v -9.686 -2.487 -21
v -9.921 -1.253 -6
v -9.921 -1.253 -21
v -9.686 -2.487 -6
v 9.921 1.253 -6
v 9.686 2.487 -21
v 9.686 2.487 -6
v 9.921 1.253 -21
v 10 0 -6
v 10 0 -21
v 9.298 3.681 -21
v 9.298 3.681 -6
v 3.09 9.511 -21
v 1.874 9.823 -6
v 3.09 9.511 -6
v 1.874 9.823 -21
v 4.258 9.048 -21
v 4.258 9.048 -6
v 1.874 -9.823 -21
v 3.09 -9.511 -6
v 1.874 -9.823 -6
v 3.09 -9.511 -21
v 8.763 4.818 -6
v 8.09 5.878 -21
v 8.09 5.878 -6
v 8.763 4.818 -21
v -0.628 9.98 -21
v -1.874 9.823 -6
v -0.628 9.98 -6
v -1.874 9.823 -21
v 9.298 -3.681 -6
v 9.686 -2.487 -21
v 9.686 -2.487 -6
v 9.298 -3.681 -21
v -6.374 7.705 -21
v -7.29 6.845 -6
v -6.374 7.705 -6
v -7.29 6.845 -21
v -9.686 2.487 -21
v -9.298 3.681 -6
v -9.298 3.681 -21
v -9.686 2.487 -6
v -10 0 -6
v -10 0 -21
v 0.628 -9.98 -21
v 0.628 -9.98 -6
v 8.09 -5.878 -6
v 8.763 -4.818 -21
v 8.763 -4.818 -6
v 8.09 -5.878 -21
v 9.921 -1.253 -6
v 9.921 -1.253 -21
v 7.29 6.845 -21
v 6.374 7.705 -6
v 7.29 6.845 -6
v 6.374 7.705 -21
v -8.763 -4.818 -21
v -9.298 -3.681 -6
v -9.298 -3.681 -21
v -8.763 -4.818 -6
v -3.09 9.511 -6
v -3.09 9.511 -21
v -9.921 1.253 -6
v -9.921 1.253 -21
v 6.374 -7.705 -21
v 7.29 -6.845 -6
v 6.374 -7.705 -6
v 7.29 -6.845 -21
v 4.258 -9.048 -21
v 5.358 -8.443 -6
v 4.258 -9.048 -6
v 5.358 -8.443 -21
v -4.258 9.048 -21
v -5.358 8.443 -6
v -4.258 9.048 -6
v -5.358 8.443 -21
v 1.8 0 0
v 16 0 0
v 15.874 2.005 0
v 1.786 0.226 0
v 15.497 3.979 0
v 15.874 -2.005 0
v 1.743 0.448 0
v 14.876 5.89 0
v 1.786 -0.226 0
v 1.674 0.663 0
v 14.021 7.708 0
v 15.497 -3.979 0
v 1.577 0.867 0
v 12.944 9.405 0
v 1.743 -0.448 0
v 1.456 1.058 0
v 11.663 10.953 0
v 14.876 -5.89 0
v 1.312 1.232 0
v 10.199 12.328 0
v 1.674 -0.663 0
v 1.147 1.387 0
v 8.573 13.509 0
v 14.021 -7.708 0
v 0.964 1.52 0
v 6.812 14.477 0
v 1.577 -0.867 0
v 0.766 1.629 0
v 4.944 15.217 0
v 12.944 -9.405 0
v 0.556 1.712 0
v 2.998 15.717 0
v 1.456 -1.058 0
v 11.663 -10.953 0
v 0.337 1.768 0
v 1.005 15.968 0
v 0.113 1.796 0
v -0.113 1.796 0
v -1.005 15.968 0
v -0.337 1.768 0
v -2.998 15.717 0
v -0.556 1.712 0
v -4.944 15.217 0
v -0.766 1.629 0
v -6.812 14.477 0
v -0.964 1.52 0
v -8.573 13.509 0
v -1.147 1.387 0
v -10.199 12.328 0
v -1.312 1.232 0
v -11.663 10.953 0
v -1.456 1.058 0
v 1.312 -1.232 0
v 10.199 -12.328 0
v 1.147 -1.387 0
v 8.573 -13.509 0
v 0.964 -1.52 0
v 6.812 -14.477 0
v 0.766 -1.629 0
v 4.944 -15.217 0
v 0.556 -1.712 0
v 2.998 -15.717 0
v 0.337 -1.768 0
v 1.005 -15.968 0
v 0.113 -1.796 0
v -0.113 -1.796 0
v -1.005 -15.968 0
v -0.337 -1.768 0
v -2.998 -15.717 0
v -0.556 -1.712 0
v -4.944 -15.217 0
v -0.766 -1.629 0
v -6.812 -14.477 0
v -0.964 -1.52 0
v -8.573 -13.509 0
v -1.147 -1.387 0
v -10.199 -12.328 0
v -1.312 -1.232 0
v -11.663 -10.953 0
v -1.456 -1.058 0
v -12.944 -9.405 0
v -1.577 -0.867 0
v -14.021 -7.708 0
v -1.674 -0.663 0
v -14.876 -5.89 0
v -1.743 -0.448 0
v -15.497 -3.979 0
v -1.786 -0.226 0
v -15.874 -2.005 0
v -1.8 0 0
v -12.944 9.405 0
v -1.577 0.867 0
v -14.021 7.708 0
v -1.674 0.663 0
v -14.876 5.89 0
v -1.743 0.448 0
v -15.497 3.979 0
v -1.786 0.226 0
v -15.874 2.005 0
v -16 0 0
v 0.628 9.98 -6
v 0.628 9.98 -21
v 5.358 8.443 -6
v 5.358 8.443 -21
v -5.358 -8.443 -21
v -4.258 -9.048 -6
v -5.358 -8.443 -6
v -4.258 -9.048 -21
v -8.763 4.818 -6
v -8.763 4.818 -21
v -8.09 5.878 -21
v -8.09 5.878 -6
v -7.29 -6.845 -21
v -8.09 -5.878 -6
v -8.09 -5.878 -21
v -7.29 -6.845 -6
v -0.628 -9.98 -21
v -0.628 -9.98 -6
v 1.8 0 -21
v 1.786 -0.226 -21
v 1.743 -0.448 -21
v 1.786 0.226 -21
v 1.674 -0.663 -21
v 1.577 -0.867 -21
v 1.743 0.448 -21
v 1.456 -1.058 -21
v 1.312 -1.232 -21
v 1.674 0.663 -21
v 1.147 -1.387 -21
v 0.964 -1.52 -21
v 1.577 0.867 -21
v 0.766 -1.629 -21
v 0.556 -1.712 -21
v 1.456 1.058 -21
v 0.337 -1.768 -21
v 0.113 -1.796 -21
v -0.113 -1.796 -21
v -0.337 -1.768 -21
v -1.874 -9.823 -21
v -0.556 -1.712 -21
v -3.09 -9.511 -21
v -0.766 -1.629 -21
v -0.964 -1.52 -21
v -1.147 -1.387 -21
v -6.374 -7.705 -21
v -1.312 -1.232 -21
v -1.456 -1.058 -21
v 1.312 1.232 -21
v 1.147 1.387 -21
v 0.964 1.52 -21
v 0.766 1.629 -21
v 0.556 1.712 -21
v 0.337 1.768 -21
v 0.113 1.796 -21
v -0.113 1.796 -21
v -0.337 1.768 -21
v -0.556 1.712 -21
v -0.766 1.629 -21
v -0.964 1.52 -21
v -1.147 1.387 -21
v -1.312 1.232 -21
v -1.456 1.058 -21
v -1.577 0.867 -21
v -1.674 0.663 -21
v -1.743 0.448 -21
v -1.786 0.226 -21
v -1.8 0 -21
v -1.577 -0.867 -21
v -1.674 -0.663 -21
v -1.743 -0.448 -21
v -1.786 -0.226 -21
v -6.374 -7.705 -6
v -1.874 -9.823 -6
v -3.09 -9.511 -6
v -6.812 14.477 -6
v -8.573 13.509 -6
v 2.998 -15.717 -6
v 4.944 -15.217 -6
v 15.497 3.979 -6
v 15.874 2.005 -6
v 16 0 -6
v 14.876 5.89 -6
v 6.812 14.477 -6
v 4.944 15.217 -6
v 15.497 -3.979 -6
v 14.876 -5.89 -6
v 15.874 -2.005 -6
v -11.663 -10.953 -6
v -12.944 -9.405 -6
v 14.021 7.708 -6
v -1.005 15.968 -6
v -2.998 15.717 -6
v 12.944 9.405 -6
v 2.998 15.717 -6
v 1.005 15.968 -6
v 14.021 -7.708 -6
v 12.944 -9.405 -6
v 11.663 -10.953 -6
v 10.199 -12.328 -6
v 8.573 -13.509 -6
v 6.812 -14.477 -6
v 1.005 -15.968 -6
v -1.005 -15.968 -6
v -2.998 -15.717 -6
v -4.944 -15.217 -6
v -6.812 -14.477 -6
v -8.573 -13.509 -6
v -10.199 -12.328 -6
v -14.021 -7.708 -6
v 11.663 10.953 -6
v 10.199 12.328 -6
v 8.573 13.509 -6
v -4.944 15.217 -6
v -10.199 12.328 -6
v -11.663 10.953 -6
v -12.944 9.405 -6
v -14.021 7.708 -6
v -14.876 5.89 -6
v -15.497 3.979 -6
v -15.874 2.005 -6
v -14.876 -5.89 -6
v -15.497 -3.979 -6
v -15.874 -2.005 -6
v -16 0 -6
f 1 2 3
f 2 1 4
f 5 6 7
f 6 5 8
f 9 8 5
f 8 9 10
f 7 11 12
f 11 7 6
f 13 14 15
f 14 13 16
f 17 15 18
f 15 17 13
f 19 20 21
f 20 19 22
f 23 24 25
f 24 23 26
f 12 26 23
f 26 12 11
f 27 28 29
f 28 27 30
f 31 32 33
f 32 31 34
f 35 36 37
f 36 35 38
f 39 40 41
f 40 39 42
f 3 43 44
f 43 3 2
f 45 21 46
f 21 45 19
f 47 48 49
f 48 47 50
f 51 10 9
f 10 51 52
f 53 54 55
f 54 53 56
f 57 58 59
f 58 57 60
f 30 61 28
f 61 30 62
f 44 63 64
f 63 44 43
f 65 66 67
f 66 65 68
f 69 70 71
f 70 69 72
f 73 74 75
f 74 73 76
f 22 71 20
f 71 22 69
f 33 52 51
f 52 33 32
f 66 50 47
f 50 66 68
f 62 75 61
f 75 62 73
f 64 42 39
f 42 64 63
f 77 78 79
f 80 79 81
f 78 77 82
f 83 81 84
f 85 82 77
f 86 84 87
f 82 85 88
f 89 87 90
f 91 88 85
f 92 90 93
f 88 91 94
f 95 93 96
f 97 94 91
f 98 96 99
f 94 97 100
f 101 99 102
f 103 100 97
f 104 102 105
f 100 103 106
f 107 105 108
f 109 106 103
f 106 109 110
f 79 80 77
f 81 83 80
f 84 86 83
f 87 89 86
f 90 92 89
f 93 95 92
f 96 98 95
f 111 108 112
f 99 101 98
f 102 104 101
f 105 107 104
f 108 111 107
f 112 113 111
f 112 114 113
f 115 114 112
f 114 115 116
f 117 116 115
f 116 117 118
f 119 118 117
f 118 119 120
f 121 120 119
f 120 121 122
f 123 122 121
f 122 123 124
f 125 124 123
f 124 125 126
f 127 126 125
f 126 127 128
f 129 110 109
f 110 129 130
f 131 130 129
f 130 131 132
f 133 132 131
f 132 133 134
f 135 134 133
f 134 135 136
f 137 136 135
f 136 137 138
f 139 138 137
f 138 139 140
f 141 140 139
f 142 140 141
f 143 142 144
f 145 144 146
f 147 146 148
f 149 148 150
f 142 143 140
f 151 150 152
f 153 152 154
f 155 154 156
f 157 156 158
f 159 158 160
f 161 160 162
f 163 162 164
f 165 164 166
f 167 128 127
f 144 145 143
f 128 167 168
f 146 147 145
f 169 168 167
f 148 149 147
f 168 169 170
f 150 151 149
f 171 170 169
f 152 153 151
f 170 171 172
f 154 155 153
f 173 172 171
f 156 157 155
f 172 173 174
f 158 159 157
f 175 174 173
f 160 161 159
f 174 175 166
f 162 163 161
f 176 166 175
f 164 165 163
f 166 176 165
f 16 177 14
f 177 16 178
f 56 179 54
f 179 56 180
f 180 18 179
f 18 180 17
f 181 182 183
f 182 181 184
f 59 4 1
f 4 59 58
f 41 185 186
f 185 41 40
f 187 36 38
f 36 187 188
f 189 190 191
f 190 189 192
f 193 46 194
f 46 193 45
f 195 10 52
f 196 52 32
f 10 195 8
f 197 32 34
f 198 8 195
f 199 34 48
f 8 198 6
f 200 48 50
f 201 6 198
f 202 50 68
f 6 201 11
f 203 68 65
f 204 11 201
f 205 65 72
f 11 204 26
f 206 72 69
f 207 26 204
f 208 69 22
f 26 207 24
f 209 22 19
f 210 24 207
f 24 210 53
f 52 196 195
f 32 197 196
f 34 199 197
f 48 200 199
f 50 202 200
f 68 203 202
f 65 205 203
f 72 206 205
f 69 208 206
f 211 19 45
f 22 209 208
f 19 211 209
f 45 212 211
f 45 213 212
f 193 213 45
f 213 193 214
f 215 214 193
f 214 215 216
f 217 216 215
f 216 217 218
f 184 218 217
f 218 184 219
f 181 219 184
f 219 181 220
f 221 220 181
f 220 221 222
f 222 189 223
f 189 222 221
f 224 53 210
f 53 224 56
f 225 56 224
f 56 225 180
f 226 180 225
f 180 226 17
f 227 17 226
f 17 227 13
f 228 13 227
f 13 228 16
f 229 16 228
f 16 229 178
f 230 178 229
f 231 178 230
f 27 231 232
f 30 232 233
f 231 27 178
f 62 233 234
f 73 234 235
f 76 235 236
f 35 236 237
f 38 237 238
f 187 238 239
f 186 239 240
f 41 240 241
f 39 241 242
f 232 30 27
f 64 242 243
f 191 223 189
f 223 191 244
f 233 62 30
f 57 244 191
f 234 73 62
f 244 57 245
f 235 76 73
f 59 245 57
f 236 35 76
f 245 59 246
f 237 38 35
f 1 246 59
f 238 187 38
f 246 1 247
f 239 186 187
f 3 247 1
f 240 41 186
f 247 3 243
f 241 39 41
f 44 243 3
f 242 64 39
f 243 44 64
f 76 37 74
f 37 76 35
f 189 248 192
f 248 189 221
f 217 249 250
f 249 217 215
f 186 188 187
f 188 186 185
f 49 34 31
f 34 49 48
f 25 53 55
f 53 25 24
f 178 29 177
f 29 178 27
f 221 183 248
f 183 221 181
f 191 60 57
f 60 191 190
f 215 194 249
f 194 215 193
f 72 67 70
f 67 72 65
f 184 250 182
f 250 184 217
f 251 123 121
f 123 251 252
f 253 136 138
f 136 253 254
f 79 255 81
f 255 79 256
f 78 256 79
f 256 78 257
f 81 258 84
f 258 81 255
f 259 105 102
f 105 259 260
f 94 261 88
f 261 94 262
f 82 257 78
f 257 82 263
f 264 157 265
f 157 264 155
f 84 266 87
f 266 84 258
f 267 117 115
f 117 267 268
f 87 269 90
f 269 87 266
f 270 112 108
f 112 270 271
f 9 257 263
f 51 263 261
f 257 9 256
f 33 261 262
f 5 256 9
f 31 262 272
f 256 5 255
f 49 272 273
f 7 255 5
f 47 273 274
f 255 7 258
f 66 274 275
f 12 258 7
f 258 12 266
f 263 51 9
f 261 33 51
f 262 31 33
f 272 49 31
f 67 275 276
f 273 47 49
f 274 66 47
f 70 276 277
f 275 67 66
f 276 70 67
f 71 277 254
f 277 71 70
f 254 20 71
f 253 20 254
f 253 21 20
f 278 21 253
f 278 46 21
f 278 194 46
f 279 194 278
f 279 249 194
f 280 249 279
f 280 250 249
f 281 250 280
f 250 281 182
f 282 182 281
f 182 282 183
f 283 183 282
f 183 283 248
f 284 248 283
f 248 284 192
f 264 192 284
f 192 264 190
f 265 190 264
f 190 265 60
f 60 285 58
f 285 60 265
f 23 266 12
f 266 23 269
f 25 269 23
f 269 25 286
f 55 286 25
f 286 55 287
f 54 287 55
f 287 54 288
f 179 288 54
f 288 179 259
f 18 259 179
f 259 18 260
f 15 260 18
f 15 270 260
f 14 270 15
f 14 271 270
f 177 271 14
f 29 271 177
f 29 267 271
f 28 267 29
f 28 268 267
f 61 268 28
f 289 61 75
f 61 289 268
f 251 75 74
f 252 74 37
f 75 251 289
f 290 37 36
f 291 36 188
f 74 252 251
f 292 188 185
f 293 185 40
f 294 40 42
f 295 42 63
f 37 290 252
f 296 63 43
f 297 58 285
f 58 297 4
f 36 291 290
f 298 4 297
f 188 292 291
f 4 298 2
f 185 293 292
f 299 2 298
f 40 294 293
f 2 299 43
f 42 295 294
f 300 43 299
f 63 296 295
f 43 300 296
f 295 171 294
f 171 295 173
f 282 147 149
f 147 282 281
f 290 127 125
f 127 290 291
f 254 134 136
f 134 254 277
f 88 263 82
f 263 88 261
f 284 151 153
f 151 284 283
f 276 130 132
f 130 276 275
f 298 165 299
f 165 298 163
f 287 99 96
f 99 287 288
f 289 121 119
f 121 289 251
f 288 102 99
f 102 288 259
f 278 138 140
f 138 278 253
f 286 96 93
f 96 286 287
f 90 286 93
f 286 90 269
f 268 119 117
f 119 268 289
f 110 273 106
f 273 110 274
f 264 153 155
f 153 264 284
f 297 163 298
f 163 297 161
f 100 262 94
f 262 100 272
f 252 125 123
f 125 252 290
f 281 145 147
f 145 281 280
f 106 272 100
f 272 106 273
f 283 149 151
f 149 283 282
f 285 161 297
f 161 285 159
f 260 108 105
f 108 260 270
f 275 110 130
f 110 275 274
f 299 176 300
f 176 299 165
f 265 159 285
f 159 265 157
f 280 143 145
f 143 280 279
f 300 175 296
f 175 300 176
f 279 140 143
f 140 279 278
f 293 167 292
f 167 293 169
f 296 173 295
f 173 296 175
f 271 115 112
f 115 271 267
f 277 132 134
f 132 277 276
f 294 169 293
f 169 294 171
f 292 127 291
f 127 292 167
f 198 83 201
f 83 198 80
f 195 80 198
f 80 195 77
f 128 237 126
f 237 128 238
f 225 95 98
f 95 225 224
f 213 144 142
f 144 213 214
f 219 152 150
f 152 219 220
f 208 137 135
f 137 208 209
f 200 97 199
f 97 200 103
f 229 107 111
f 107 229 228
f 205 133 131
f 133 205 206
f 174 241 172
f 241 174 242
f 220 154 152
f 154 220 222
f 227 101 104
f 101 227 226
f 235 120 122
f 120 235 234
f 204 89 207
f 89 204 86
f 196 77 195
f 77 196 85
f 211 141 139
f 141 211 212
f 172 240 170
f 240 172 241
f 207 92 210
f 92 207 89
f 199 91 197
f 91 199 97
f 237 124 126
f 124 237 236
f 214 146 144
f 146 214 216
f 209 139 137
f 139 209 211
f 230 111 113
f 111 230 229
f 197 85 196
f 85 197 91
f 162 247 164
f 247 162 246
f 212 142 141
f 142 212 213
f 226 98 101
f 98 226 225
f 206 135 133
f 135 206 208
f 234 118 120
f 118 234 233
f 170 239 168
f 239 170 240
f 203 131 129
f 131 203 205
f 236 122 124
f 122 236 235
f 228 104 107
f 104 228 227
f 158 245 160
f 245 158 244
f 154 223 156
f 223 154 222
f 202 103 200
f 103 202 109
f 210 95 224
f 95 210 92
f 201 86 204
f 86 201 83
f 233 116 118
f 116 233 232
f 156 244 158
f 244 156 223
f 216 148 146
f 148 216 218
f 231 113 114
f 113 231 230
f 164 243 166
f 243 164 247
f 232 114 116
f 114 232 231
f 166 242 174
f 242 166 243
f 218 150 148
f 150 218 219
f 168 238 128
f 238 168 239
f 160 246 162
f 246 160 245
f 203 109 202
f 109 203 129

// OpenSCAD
$fn = 50;


difference() {
	union() {
		translate(v = [0, 0, -21.0000000000]) {
			cylinder(h = 21, r = 10.0000000000);
		}
		translate(v = [0, 0, -6.0000000000]) {
			cylinder(h = 6, r = 16.0000000000);
		}
	}
	union() {
		#translate(v = [0, 0, -21]) {
			cylinder(h = 21, r = 1.8000000000);
		}
	}
}
